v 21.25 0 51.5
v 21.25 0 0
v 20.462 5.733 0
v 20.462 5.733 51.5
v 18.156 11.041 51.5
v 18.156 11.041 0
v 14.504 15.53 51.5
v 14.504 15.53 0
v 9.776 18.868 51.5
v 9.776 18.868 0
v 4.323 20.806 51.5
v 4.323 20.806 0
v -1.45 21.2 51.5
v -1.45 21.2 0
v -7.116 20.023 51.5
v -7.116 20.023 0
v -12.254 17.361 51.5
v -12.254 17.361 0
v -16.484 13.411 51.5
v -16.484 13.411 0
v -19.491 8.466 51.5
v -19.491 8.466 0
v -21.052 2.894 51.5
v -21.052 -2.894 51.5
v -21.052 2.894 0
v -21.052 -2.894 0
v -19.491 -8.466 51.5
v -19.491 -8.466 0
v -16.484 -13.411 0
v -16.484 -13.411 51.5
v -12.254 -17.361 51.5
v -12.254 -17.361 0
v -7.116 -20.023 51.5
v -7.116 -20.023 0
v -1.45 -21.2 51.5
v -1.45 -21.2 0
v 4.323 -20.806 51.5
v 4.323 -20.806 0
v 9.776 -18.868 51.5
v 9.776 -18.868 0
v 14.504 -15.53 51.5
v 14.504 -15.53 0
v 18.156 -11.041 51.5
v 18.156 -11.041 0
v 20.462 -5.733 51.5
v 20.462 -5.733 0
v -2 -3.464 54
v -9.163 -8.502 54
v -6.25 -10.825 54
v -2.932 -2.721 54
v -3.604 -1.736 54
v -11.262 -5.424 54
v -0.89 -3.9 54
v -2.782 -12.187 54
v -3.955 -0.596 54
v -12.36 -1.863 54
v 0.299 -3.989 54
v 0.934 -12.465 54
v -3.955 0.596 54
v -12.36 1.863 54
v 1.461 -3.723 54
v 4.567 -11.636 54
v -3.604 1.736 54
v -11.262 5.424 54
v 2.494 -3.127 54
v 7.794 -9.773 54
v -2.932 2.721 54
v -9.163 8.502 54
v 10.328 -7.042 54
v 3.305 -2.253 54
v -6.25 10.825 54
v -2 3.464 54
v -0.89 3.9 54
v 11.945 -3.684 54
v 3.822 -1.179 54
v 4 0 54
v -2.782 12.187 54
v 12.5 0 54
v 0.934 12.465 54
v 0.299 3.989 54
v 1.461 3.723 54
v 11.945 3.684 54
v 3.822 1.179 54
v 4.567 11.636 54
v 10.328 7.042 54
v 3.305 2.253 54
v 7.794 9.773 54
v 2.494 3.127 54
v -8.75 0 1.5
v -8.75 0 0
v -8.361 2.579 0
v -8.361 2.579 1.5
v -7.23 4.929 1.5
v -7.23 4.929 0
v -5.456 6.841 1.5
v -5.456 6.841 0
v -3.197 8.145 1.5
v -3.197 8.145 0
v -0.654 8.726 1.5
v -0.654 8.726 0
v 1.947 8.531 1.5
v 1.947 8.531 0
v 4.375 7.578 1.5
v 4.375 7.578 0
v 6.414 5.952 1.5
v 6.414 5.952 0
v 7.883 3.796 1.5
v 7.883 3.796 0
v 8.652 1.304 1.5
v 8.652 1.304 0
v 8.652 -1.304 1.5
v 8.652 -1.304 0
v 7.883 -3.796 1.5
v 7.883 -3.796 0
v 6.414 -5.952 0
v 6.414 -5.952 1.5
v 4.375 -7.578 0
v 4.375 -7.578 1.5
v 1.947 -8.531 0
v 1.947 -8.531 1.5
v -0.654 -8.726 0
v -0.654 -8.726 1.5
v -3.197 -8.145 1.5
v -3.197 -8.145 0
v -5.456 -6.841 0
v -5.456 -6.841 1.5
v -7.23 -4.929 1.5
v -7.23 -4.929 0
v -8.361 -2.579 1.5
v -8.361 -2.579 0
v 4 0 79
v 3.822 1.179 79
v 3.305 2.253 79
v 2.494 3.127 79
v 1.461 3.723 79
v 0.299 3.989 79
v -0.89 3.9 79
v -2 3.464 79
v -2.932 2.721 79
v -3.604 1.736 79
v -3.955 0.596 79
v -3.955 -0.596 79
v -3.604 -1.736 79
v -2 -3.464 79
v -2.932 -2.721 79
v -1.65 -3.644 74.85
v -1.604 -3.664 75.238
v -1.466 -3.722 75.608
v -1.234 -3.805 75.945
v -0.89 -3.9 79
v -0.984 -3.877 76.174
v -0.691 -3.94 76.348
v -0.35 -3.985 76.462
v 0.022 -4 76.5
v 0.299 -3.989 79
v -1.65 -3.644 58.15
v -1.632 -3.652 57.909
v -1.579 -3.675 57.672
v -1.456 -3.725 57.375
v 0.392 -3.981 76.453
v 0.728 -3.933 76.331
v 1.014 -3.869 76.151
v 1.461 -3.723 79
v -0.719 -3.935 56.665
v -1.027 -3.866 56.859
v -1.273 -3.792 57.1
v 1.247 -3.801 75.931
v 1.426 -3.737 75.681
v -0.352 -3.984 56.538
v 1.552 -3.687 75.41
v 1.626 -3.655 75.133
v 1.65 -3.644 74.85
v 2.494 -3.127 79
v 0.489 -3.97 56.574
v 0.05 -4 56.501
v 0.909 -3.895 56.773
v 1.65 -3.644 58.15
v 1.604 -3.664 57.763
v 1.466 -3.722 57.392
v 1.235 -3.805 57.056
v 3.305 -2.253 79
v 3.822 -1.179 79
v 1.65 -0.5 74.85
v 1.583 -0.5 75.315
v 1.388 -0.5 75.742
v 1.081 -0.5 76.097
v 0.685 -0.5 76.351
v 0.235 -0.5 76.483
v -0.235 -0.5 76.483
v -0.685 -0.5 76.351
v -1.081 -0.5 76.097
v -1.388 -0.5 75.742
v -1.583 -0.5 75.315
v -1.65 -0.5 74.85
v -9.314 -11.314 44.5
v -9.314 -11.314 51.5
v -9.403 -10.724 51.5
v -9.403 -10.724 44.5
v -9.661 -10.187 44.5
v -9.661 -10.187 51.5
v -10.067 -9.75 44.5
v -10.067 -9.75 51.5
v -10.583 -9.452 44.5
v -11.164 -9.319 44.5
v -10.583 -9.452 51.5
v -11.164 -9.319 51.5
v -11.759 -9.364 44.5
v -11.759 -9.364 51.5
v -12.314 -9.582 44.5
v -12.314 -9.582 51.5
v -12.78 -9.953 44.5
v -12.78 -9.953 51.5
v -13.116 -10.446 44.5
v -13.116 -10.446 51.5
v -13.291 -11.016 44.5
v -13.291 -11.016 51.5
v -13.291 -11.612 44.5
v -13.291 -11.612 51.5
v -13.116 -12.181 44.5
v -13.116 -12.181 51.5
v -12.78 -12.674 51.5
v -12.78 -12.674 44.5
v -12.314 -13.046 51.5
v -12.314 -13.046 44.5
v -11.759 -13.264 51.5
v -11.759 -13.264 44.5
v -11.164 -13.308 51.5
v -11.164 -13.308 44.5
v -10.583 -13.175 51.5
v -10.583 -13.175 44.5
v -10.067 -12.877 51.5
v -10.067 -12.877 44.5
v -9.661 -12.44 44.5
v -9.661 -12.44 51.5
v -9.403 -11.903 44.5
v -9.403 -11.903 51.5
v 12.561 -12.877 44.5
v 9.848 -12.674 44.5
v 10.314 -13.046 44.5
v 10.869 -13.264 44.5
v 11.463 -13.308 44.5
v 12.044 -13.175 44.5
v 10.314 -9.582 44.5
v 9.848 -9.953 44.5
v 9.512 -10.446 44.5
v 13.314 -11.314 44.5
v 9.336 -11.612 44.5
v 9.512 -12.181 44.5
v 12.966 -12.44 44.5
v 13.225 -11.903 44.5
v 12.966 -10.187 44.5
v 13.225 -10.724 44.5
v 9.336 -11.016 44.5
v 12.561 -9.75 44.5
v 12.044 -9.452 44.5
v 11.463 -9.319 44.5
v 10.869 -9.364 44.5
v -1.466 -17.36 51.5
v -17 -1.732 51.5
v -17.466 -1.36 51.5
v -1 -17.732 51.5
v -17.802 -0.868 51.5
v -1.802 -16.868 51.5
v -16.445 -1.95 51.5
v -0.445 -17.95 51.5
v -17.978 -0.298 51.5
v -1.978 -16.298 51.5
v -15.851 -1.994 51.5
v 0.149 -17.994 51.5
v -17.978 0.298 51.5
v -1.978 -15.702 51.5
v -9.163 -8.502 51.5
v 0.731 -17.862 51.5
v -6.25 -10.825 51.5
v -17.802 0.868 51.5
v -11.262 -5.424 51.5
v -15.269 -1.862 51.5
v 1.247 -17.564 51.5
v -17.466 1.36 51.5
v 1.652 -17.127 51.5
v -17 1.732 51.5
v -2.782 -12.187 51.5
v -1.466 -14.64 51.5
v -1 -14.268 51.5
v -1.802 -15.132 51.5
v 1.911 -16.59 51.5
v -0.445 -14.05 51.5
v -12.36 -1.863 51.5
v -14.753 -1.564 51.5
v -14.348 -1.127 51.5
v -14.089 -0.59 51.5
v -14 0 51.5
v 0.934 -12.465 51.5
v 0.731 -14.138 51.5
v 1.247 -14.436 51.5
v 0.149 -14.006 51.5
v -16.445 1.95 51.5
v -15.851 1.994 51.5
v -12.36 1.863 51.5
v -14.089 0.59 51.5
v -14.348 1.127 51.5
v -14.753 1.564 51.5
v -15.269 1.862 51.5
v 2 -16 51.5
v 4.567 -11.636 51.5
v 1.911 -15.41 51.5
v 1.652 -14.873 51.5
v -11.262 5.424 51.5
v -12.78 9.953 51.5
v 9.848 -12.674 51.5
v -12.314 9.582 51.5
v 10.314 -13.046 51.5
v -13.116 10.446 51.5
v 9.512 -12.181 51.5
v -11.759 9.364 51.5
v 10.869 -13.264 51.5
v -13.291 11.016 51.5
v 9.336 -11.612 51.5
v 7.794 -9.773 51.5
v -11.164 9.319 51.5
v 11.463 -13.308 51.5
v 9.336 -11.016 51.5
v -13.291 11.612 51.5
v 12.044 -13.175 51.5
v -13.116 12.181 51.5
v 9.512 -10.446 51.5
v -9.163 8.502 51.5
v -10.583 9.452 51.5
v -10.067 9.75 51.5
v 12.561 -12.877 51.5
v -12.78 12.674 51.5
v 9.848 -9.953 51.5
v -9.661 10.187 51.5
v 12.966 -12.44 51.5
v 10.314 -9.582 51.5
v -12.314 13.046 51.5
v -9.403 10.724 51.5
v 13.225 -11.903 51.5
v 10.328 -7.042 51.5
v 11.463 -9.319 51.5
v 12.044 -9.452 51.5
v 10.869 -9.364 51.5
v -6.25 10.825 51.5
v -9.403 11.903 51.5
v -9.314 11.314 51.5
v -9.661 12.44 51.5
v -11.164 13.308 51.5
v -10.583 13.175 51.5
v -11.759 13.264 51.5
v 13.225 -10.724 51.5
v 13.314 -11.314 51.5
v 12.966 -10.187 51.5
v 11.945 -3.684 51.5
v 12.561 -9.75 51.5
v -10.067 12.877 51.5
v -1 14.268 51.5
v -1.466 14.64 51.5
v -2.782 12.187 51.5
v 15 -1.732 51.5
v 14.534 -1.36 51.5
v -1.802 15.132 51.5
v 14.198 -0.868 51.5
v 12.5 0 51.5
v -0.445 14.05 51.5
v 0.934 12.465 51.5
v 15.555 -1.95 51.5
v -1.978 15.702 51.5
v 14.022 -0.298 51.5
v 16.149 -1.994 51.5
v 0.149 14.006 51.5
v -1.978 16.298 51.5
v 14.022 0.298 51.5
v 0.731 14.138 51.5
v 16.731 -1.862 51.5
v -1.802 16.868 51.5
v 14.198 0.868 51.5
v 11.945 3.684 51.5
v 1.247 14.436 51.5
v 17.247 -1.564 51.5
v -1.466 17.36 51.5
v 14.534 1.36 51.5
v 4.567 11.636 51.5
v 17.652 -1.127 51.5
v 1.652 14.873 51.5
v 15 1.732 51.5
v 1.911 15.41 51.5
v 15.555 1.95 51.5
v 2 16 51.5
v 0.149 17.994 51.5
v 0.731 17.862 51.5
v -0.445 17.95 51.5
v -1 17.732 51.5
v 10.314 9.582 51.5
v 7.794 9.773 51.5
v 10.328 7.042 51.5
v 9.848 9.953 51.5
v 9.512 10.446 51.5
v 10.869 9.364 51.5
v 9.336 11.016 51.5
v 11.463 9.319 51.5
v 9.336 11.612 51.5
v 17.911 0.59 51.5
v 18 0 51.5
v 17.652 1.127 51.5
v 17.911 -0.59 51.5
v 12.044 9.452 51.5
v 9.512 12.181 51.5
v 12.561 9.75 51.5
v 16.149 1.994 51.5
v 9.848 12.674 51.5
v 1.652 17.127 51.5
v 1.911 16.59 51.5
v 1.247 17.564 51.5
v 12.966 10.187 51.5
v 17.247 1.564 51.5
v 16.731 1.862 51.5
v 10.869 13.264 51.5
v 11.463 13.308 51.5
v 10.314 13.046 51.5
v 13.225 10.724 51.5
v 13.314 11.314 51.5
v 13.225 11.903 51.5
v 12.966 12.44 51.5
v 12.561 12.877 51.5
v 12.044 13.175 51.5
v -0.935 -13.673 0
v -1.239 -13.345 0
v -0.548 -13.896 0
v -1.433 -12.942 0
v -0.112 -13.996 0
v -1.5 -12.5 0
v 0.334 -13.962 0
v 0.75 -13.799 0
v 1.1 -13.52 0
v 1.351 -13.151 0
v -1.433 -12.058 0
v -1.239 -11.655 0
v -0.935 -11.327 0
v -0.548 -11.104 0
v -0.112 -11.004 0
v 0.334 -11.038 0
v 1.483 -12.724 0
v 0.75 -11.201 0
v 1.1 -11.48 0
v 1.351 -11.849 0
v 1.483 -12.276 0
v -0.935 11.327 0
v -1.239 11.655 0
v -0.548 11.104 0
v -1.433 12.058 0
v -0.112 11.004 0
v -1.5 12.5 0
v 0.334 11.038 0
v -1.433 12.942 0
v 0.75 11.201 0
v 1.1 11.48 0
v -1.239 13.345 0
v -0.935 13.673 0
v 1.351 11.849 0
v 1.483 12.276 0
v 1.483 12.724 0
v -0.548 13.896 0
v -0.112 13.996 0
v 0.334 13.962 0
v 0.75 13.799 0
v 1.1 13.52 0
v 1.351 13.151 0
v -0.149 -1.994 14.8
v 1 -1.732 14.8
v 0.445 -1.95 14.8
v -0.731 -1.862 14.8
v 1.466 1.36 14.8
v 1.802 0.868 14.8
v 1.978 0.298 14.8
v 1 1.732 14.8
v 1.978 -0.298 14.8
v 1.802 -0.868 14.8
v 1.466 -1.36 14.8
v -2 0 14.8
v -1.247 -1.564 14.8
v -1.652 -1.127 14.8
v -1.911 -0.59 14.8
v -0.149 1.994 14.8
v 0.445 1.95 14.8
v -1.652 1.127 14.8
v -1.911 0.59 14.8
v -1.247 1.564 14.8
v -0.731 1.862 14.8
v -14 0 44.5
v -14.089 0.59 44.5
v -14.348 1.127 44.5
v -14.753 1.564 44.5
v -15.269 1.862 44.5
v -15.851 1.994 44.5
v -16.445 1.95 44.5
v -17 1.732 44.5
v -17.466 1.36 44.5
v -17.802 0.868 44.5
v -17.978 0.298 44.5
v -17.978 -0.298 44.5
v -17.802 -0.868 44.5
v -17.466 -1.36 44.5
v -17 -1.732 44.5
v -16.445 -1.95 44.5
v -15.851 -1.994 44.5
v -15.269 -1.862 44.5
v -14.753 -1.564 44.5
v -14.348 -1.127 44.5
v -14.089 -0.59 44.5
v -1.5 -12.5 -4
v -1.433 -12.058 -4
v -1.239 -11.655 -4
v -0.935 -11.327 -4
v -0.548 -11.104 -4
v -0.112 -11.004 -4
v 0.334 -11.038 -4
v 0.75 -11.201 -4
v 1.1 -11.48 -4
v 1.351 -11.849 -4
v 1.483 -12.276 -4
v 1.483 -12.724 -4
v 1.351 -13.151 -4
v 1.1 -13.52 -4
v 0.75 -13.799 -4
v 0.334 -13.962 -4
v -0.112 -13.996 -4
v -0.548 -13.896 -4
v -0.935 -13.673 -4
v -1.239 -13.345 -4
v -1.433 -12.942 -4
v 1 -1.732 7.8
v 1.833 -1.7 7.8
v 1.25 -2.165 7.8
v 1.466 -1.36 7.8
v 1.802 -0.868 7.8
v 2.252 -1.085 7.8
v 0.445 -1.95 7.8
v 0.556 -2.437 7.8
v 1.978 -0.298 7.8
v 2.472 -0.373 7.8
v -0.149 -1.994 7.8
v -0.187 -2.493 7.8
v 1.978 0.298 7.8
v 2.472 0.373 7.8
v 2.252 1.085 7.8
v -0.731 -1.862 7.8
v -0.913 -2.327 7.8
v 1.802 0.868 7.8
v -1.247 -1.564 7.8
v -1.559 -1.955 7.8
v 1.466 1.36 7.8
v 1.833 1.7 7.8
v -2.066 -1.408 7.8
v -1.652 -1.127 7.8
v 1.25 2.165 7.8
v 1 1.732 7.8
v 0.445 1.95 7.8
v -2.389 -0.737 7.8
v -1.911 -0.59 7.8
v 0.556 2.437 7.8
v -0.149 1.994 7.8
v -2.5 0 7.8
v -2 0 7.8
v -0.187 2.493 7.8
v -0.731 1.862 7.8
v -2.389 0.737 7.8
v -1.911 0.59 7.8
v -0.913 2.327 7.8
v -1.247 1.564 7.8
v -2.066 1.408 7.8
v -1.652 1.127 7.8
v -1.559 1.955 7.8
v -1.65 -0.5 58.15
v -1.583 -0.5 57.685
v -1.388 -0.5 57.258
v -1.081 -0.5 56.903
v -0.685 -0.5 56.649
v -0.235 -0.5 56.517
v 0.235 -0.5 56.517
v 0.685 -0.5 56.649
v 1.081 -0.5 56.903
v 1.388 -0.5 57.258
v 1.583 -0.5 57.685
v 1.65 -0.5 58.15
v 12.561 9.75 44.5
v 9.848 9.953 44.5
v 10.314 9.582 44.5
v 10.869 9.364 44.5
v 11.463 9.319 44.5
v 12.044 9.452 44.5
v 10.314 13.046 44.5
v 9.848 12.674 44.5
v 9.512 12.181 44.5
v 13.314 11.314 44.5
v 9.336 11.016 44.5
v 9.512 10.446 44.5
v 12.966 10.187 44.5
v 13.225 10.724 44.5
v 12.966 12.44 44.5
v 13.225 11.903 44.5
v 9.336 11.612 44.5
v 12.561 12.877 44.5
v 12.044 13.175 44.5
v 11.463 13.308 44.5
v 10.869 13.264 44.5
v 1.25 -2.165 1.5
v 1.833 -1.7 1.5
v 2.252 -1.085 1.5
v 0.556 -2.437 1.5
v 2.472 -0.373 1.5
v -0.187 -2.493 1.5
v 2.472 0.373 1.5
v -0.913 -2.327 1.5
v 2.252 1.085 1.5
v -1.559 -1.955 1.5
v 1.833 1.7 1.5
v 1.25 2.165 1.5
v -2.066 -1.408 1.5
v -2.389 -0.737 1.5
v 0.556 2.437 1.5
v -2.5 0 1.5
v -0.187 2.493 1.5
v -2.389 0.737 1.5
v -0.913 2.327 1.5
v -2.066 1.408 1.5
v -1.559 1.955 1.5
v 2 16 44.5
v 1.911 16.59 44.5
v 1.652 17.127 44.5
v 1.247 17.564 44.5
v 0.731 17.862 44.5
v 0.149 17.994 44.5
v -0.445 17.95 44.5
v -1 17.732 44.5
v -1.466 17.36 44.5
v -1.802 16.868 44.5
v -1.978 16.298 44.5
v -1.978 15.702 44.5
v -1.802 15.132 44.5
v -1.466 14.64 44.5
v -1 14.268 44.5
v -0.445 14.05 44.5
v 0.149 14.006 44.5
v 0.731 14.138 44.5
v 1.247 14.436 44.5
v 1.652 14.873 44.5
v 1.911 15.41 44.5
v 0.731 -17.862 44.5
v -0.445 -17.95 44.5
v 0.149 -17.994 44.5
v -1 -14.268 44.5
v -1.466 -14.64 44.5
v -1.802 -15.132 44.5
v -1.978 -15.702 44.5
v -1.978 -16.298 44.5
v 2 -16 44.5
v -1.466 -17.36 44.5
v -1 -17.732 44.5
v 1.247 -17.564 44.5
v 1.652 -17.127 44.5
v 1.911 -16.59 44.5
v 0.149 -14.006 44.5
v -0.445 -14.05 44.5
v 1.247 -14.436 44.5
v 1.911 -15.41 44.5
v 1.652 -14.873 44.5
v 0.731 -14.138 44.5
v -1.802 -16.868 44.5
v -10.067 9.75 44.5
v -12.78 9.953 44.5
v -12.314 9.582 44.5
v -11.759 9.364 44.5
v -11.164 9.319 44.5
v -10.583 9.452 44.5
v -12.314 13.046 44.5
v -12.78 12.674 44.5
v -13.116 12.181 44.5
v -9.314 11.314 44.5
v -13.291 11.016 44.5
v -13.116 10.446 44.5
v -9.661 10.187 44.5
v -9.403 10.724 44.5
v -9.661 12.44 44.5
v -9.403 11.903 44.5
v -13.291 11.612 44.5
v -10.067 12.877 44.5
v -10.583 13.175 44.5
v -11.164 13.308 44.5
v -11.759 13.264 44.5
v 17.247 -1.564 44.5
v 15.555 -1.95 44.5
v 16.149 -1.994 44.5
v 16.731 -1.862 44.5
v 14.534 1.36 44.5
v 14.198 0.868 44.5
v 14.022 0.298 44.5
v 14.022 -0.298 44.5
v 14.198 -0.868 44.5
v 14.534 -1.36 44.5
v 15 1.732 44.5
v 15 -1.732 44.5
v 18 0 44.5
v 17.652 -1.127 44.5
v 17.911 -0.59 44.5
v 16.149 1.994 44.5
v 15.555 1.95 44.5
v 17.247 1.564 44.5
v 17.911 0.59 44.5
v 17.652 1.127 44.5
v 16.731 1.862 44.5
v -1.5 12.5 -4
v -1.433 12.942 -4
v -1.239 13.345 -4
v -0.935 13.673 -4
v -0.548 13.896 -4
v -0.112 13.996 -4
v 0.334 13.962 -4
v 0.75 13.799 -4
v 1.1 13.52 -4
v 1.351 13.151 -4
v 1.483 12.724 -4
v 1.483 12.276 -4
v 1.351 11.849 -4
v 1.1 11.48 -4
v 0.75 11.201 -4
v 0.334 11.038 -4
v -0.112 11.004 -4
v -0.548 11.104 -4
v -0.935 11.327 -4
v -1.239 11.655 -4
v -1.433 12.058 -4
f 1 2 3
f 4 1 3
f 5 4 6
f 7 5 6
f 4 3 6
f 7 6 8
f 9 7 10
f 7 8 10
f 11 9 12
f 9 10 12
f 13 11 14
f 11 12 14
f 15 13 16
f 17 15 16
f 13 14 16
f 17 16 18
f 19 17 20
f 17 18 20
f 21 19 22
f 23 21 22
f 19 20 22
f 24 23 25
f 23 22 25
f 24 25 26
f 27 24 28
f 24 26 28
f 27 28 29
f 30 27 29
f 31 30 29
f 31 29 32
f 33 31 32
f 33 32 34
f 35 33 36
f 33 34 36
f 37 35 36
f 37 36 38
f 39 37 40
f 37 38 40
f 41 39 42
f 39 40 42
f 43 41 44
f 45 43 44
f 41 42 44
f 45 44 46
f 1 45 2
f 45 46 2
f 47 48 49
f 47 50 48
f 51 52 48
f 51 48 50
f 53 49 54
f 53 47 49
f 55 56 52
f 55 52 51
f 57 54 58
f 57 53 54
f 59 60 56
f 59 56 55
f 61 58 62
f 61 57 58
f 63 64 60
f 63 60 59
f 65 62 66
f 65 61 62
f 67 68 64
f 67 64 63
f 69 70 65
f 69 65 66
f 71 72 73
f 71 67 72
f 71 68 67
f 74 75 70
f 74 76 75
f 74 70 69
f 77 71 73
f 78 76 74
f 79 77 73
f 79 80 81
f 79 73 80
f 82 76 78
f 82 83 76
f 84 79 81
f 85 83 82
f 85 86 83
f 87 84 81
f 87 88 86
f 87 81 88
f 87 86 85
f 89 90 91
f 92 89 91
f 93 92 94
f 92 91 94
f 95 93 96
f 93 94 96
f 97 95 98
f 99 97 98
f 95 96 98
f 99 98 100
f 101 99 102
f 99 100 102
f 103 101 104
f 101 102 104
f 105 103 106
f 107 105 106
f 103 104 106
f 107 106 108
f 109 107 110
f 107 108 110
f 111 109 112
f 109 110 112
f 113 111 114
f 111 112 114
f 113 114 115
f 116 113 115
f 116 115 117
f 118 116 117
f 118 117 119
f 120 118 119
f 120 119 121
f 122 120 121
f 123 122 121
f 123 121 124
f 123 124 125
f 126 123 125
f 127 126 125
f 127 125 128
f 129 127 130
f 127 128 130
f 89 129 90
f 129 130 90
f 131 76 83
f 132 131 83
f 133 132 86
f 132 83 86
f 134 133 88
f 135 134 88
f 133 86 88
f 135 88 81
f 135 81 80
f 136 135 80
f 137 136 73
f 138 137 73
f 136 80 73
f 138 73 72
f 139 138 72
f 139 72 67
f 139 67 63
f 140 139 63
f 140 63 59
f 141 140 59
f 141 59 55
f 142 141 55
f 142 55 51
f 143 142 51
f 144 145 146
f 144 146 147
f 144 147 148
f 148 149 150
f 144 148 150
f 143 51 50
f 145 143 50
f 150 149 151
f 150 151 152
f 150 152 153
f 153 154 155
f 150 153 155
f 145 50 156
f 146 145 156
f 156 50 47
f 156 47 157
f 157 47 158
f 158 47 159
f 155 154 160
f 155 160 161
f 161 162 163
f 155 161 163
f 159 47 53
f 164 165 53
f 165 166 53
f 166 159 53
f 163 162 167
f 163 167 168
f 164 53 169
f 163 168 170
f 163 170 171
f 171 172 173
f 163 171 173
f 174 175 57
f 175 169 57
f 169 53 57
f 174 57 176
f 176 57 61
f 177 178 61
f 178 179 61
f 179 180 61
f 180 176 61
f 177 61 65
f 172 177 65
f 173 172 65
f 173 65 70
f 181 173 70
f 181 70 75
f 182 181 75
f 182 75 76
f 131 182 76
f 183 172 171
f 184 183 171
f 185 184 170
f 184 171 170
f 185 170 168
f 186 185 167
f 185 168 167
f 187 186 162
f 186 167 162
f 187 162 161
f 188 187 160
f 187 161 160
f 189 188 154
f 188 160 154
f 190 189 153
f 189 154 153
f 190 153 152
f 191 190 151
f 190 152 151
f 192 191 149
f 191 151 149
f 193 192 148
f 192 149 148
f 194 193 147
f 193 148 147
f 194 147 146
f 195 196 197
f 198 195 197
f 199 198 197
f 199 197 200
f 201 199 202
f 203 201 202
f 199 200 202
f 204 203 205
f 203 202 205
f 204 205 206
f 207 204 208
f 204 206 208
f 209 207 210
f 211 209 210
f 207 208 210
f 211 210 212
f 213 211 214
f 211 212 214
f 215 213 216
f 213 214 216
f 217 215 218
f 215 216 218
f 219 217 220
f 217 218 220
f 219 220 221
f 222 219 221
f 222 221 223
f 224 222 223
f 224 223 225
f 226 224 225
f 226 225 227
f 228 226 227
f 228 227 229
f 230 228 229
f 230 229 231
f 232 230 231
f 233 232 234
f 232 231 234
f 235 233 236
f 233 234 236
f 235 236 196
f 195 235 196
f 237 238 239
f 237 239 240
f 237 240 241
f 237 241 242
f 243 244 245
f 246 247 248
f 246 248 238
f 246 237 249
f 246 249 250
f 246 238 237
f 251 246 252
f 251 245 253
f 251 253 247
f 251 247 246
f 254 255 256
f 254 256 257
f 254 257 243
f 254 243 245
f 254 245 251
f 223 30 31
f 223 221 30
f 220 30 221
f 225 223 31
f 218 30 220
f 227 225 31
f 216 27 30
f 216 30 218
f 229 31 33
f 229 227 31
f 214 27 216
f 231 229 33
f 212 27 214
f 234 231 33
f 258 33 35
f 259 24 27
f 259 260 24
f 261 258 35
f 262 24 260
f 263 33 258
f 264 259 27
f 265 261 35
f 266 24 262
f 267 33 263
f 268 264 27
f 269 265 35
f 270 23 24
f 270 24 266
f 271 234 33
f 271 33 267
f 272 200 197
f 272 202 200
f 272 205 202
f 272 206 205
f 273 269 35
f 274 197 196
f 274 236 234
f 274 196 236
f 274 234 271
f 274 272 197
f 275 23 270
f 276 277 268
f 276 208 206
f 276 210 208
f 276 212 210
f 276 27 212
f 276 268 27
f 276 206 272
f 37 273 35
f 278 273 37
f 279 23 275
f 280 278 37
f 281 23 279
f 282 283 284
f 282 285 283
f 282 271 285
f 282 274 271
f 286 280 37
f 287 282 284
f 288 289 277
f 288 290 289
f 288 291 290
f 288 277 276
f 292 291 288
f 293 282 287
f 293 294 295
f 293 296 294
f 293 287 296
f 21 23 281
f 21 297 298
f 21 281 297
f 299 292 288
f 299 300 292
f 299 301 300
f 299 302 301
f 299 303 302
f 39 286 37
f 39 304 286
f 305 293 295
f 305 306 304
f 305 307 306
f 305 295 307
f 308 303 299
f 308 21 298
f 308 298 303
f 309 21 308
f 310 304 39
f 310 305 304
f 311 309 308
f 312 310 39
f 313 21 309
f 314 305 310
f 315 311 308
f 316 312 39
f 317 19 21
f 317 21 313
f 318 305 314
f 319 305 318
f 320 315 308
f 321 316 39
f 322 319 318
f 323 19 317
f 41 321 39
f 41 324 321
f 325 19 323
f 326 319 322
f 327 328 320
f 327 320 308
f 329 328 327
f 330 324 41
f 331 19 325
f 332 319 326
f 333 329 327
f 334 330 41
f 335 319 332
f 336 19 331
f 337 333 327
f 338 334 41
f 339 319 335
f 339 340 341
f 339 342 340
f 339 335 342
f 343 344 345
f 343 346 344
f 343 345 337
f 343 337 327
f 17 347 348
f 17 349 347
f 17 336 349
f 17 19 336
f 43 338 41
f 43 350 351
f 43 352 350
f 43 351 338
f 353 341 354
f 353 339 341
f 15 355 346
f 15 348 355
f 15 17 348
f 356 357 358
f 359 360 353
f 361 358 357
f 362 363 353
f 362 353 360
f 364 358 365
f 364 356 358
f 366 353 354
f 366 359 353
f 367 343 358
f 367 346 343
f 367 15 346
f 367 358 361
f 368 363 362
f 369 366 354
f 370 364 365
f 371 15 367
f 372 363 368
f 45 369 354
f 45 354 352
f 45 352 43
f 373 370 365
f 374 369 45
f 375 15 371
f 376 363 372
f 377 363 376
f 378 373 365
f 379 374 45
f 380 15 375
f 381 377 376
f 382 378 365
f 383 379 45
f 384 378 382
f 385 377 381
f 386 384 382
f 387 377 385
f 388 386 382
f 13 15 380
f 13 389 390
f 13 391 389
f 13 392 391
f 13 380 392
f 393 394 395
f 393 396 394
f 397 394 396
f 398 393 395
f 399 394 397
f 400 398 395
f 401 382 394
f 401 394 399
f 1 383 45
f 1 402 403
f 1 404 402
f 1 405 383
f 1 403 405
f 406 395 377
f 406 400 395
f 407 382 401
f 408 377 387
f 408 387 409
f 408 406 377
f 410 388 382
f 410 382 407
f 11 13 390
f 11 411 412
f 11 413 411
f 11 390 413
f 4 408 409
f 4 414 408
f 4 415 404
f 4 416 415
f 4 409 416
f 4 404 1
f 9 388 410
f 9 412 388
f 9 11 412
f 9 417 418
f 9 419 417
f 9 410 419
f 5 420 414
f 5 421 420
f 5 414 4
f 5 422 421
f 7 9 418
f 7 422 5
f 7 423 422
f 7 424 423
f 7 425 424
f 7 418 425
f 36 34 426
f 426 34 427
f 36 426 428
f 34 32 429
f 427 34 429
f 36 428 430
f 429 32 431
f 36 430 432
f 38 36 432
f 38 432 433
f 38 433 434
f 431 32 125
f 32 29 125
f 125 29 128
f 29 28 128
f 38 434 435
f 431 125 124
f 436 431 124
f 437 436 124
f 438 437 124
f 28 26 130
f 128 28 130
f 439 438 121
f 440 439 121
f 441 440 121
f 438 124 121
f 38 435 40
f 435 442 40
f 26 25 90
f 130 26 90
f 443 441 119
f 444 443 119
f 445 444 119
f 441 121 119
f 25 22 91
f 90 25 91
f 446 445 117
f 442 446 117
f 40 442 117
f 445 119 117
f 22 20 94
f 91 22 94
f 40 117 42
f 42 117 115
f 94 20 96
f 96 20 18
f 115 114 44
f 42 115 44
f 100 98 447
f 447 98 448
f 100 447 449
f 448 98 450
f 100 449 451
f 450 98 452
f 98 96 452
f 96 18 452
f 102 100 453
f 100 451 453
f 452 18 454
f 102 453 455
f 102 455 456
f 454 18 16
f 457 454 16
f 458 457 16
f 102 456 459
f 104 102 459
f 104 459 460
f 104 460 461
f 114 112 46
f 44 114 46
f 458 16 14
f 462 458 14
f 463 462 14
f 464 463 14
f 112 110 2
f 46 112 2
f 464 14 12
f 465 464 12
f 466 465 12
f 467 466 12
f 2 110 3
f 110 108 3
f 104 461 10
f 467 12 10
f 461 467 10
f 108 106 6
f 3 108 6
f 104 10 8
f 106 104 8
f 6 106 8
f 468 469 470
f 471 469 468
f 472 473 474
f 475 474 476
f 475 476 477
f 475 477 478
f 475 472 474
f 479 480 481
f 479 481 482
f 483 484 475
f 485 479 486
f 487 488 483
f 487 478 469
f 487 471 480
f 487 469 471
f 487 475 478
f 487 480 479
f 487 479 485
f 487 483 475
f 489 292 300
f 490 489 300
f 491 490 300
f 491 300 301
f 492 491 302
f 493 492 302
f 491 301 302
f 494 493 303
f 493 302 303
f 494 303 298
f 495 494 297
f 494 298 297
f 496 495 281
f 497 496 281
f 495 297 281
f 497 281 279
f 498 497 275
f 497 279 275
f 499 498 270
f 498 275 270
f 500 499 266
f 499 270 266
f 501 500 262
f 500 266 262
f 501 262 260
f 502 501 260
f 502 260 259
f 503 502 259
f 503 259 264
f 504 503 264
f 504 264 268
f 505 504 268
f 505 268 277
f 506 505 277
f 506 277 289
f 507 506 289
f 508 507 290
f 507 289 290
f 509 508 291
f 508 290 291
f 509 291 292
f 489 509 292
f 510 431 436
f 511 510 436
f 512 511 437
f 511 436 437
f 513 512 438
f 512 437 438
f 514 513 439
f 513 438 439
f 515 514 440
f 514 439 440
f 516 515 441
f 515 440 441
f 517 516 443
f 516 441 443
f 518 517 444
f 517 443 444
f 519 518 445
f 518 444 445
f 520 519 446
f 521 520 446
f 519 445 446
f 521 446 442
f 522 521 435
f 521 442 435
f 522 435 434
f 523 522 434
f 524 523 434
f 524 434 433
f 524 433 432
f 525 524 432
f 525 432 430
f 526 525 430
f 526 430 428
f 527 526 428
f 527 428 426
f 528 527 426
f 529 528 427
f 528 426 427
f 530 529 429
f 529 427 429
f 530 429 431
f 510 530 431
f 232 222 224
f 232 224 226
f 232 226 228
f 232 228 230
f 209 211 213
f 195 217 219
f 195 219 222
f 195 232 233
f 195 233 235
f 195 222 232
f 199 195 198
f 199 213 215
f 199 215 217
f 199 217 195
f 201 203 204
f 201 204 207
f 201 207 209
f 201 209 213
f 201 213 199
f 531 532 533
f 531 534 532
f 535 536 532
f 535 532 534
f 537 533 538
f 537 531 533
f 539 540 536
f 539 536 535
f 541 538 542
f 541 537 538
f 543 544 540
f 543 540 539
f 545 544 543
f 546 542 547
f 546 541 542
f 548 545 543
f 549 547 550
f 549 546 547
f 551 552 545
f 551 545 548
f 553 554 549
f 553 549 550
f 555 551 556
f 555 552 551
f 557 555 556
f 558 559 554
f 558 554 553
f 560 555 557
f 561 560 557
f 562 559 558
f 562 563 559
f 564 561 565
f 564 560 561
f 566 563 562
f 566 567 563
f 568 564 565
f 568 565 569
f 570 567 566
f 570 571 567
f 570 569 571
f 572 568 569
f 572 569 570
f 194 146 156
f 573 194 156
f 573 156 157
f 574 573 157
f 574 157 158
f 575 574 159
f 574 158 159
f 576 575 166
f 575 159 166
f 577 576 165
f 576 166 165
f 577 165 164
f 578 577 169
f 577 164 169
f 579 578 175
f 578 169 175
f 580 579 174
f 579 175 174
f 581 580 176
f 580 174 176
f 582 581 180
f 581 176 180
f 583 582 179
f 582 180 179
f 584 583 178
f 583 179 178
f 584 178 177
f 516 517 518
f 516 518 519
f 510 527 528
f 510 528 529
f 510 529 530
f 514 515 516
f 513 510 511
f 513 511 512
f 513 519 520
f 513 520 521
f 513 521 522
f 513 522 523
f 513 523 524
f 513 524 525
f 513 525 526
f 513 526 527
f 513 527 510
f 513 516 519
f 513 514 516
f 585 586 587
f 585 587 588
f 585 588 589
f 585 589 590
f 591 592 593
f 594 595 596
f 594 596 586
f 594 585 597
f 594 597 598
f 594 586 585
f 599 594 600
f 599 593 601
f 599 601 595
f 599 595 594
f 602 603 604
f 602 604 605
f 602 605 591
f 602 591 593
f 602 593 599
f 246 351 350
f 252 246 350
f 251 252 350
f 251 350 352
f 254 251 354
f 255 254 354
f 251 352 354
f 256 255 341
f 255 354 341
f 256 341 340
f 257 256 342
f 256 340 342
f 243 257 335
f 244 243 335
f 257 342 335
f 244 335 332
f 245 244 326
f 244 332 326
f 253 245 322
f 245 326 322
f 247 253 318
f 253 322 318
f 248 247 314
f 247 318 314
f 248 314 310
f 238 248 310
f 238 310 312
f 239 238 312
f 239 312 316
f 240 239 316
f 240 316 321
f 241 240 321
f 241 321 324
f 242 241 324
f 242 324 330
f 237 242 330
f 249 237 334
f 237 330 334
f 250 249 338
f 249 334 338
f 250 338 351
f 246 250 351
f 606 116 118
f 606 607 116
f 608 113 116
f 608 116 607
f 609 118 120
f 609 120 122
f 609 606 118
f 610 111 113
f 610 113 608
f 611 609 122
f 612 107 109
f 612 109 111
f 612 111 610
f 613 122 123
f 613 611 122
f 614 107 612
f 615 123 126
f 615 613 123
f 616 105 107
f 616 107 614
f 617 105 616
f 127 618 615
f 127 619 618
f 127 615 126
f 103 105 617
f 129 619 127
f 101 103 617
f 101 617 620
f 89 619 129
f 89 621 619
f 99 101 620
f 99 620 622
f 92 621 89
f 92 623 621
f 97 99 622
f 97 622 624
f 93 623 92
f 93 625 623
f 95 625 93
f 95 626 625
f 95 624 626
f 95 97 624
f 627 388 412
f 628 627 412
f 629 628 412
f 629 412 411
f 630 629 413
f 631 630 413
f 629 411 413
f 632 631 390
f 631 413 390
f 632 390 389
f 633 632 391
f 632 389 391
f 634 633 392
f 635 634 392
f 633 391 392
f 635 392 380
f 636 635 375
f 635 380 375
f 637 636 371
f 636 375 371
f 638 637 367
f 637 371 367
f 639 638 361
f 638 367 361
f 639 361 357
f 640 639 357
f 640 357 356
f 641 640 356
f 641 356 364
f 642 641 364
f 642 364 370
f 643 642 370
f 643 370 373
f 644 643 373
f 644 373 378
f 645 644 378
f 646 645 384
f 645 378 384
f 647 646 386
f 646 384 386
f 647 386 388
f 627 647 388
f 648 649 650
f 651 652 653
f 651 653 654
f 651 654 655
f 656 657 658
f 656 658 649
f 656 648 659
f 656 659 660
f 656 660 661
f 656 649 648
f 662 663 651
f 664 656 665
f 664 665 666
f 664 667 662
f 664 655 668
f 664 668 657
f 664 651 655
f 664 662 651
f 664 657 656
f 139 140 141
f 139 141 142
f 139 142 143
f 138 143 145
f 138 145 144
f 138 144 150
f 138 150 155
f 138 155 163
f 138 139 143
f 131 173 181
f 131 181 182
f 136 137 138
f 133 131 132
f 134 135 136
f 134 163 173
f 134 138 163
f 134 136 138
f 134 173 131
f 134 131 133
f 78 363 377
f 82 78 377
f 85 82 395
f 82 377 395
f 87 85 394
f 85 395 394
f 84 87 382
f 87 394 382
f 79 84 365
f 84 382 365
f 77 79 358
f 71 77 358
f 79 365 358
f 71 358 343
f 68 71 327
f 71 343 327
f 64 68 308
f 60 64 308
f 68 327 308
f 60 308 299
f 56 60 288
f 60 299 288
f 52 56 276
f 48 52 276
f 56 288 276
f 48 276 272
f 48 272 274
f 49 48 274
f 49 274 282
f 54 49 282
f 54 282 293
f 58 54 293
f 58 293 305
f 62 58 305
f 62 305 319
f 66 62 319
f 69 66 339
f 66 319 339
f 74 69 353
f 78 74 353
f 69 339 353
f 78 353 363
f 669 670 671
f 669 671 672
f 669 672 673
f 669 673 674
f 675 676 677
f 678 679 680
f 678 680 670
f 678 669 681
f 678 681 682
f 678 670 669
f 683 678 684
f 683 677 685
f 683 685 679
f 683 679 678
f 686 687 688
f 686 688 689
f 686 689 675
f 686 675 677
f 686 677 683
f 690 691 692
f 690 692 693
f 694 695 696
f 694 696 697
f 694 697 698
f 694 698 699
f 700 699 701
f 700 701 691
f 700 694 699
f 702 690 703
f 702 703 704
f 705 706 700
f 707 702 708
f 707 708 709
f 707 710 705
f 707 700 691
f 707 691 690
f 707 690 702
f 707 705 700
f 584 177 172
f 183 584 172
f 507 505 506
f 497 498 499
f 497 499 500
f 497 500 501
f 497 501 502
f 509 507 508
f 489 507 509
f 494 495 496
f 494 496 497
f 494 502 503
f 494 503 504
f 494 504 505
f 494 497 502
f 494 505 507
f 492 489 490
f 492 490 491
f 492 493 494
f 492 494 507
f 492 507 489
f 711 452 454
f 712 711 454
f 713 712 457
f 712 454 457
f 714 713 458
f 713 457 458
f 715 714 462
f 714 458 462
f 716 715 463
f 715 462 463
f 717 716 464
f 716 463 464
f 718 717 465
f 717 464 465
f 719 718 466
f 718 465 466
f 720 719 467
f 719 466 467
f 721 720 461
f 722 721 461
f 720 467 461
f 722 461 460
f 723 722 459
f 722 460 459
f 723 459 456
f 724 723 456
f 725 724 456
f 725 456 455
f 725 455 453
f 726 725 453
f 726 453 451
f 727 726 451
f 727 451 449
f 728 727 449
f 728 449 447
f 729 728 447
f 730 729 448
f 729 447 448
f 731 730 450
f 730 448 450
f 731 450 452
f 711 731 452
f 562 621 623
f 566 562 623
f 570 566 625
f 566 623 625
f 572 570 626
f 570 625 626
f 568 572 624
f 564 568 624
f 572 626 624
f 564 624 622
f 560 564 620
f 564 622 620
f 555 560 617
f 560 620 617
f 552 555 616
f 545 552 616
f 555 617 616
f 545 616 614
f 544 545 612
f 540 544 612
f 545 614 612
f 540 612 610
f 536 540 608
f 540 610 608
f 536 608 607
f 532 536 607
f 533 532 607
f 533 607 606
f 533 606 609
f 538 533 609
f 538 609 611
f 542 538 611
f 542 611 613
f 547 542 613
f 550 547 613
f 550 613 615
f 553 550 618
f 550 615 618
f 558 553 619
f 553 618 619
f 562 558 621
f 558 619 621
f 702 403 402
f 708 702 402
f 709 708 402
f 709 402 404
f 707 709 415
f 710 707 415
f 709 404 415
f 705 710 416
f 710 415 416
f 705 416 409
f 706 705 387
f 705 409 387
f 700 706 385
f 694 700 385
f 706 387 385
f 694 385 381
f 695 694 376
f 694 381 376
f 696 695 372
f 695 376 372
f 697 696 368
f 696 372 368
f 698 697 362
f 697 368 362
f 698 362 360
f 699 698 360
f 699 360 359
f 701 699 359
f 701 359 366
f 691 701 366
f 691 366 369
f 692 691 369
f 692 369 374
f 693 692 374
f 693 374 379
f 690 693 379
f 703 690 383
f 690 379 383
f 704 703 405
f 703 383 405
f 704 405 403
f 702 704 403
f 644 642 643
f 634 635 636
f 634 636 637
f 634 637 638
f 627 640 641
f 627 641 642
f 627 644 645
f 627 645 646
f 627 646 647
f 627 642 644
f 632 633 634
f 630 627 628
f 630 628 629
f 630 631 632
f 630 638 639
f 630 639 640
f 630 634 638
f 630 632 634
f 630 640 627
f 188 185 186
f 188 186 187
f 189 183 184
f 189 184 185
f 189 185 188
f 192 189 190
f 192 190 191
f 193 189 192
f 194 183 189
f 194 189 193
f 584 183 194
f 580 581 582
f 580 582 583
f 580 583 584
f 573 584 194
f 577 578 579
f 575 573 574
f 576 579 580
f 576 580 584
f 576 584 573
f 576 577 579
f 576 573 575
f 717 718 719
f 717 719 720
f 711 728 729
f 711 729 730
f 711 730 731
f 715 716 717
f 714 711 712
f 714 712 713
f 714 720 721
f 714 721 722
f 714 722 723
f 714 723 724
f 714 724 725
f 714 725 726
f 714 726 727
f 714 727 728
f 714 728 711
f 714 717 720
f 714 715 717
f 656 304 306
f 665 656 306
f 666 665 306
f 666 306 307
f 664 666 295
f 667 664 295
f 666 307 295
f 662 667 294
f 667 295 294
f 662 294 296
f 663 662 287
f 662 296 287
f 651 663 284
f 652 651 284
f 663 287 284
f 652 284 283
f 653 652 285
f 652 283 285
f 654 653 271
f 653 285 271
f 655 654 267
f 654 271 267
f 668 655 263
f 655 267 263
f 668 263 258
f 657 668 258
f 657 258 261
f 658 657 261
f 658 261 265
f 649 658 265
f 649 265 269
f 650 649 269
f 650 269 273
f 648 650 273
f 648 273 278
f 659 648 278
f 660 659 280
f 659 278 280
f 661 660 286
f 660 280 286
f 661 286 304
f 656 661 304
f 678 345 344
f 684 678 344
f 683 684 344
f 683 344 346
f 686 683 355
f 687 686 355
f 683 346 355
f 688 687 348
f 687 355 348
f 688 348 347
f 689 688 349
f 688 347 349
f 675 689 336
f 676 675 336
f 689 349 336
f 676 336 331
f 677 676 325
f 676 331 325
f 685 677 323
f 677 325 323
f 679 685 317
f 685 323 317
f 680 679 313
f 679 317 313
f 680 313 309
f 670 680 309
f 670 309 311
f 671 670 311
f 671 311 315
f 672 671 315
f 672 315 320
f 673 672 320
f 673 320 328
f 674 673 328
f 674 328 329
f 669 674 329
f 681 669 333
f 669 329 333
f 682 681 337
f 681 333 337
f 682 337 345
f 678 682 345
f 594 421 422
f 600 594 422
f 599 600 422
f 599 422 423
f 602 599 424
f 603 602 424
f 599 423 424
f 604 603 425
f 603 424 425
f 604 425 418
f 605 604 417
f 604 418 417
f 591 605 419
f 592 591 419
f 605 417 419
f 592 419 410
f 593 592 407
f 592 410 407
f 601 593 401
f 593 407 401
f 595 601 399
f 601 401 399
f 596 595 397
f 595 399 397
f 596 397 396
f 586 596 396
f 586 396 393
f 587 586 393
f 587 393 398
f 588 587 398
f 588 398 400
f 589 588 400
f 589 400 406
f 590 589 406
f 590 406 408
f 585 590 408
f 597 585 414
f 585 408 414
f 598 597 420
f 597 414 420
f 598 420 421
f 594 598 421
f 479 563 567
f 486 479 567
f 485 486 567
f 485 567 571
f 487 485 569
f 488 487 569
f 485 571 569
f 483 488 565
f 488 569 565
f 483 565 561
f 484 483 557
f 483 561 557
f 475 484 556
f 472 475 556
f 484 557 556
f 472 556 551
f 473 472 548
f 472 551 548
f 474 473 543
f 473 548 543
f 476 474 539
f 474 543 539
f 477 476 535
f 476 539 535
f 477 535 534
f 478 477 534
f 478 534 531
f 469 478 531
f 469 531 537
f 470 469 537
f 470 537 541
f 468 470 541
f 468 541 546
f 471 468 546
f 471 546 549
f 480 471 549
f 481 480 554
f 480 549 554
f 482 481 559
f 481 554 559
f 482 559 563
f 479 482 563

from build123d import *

# Parameters (mm, degrees)
SKETCH_1_R           = 21.25
EXTRUDE_1_DEPTH      = 51.5
SKETCH_2_R           = 1.5
EXTRUDE_2_DEPTH      = 4
SKETCH_3_R           = 8.75
CUT_EXTRUDE_1_DEPTH  = 1.5
SKETCH_4_R           = 2.5
CUT_EXTRUDE_2_DEPTH  = 6.3
SKETCH_5_R           = 2
CUT_EXTRUDE_3_DEPTH  = 7
SKETCH_7_R           = 12.5
EXTRUDE_3_DEPTH      = 2.5
SKETCH_11_R          = 4
EXTRUDE_5_DEPTH      = 25
CUT_EXTRUDE_11_DEPTH = 3.5
SKETCH_13_R          = 2
CUT_EXTRUDE_10_DEPTH = 7


with BuildPart() as part:
    # 草圖1 → 填料-伸長1 (new body)
    with BuildSketch(Plane.XY):
        Circle(SKETCH_1_R)
    extrude(amount=EXTRUDE_1_DEPTH)

    # 草圖2 → 填料-伸長2 (add)
    with BuildSketch(Plane(origin=(0, 0, 0), x_dir=(-1, 0, 0), z_dir=(0, 0, -1))):
        with Locations((0, 12.5)):
            Circle(SKETCH_2_R)
        with Locations((0, -12.5)):
            Circle(SKETCH_2_R)
    extrude(amount=EXTRUDE_2_DEPTH)

    # 草圖3 → 除料-伸長1 (cut)
    with BuildSketch(Plane(origin=(0, 0, 0), x_dir=(-1, 0, 0), z_dir=(0, 0, -1))):
        Circle(SKETCH_3_R)
    extrude(amount=-CUT_EXTRUDE_1_DEPTH, mode=Mode.SUBTRACT)

    # 草圖4 → 除料-伸長2 (cut)
    with BuildSketch(Plane(origin=(0, 0, 1.5), x_dir=(-1, 0, 0), z_dir=(0, 0, -1))):
        Circle(SKETCH_4_R)
    extrude(amount=-CUT_EXTRUDE_2_DEPTH, mode=Mode.SUBTRACT)

    # 草圖5 → 除料-伸長3 (cut)
    with BuildSketch(Plane(origin=(0, 0, 7.8), x_dir=(-1, 0, 0), z_dir=(0, 0, -1))):
        Circle(SKETCH_5_R)
    extrude(amount=-CUT_EXTRUDE_3_DEPTH, mode=Mode.SUBTRACT)

    # 草圖7 → 填料-伸長3 (add)
    with BuildSketch(Plane.XY.offset(51.5)):
        Circle(SKETCH_7_R)
    extrude(amount=EXTRUDE_3_DEPTH)

    # 草圖11 → 填料-伸長5 (add)
    with BuildSketch(Plane.XY.offset(54)):
        Circle(SKETCH_11_R)
    extrude(amount=EXTRUDE_5_DEPTH)

    # 草圖12 → 除料-伸長11 (cut)
    with BuildSketch(Plane(origin=(0, -4, 0), x_dir=(1, 0, 0), z_dir=(0, 1, 0))):
        with BuildLine():
            Line((-1.65, -74.85), (-1.65, -58.15))
            ThreePointArc((-1.65, -58.15), (0, -56.5), (1.65, -58.15))
            Line((1.65, -58.15), (1.65, -74.85))
            ThreePointArc((1.65, -74.85), (0, -76.5), (-1.65, -74.85))
        make_face()
    extrude(amount=CUT_EXTRUDE_11_DEPTH, mode=Mode.SUBTRACT)

    # 草圖13 → 除料-伸長10 (cut)
    with BuildSketch(Plane.XY.offset(51.5)):
        with Locations((16, 0)):
            Circle(SKETCH_13_R)
        with Locations((0, -16)):
            Circle(SKETCH_13_R)
        with Locations((-16, 0)):
            Circle(SKETCH_13_R)
        with Locations((0, 16)):
            Circle(SKETCH_13_R)
        with Locations((11.313708499, 11.313708499)):
            Circle(SKETCH_13_R)
        with Locations((11.313708499, -11.313708499)):
            Circle(SKETCH_13_R)
        with Locations((-11.313708499, -11.313708499)):
            Circle(SKETCH_13_R)
        with Locations((-11.313708499, 11.313708499)):
            Circle(SKETCH_13_R)
    extrude(amount=-CUT_EXTRUDE_10_DEPTH, mode=Mode.SUBTRACT)


solid = part.part
